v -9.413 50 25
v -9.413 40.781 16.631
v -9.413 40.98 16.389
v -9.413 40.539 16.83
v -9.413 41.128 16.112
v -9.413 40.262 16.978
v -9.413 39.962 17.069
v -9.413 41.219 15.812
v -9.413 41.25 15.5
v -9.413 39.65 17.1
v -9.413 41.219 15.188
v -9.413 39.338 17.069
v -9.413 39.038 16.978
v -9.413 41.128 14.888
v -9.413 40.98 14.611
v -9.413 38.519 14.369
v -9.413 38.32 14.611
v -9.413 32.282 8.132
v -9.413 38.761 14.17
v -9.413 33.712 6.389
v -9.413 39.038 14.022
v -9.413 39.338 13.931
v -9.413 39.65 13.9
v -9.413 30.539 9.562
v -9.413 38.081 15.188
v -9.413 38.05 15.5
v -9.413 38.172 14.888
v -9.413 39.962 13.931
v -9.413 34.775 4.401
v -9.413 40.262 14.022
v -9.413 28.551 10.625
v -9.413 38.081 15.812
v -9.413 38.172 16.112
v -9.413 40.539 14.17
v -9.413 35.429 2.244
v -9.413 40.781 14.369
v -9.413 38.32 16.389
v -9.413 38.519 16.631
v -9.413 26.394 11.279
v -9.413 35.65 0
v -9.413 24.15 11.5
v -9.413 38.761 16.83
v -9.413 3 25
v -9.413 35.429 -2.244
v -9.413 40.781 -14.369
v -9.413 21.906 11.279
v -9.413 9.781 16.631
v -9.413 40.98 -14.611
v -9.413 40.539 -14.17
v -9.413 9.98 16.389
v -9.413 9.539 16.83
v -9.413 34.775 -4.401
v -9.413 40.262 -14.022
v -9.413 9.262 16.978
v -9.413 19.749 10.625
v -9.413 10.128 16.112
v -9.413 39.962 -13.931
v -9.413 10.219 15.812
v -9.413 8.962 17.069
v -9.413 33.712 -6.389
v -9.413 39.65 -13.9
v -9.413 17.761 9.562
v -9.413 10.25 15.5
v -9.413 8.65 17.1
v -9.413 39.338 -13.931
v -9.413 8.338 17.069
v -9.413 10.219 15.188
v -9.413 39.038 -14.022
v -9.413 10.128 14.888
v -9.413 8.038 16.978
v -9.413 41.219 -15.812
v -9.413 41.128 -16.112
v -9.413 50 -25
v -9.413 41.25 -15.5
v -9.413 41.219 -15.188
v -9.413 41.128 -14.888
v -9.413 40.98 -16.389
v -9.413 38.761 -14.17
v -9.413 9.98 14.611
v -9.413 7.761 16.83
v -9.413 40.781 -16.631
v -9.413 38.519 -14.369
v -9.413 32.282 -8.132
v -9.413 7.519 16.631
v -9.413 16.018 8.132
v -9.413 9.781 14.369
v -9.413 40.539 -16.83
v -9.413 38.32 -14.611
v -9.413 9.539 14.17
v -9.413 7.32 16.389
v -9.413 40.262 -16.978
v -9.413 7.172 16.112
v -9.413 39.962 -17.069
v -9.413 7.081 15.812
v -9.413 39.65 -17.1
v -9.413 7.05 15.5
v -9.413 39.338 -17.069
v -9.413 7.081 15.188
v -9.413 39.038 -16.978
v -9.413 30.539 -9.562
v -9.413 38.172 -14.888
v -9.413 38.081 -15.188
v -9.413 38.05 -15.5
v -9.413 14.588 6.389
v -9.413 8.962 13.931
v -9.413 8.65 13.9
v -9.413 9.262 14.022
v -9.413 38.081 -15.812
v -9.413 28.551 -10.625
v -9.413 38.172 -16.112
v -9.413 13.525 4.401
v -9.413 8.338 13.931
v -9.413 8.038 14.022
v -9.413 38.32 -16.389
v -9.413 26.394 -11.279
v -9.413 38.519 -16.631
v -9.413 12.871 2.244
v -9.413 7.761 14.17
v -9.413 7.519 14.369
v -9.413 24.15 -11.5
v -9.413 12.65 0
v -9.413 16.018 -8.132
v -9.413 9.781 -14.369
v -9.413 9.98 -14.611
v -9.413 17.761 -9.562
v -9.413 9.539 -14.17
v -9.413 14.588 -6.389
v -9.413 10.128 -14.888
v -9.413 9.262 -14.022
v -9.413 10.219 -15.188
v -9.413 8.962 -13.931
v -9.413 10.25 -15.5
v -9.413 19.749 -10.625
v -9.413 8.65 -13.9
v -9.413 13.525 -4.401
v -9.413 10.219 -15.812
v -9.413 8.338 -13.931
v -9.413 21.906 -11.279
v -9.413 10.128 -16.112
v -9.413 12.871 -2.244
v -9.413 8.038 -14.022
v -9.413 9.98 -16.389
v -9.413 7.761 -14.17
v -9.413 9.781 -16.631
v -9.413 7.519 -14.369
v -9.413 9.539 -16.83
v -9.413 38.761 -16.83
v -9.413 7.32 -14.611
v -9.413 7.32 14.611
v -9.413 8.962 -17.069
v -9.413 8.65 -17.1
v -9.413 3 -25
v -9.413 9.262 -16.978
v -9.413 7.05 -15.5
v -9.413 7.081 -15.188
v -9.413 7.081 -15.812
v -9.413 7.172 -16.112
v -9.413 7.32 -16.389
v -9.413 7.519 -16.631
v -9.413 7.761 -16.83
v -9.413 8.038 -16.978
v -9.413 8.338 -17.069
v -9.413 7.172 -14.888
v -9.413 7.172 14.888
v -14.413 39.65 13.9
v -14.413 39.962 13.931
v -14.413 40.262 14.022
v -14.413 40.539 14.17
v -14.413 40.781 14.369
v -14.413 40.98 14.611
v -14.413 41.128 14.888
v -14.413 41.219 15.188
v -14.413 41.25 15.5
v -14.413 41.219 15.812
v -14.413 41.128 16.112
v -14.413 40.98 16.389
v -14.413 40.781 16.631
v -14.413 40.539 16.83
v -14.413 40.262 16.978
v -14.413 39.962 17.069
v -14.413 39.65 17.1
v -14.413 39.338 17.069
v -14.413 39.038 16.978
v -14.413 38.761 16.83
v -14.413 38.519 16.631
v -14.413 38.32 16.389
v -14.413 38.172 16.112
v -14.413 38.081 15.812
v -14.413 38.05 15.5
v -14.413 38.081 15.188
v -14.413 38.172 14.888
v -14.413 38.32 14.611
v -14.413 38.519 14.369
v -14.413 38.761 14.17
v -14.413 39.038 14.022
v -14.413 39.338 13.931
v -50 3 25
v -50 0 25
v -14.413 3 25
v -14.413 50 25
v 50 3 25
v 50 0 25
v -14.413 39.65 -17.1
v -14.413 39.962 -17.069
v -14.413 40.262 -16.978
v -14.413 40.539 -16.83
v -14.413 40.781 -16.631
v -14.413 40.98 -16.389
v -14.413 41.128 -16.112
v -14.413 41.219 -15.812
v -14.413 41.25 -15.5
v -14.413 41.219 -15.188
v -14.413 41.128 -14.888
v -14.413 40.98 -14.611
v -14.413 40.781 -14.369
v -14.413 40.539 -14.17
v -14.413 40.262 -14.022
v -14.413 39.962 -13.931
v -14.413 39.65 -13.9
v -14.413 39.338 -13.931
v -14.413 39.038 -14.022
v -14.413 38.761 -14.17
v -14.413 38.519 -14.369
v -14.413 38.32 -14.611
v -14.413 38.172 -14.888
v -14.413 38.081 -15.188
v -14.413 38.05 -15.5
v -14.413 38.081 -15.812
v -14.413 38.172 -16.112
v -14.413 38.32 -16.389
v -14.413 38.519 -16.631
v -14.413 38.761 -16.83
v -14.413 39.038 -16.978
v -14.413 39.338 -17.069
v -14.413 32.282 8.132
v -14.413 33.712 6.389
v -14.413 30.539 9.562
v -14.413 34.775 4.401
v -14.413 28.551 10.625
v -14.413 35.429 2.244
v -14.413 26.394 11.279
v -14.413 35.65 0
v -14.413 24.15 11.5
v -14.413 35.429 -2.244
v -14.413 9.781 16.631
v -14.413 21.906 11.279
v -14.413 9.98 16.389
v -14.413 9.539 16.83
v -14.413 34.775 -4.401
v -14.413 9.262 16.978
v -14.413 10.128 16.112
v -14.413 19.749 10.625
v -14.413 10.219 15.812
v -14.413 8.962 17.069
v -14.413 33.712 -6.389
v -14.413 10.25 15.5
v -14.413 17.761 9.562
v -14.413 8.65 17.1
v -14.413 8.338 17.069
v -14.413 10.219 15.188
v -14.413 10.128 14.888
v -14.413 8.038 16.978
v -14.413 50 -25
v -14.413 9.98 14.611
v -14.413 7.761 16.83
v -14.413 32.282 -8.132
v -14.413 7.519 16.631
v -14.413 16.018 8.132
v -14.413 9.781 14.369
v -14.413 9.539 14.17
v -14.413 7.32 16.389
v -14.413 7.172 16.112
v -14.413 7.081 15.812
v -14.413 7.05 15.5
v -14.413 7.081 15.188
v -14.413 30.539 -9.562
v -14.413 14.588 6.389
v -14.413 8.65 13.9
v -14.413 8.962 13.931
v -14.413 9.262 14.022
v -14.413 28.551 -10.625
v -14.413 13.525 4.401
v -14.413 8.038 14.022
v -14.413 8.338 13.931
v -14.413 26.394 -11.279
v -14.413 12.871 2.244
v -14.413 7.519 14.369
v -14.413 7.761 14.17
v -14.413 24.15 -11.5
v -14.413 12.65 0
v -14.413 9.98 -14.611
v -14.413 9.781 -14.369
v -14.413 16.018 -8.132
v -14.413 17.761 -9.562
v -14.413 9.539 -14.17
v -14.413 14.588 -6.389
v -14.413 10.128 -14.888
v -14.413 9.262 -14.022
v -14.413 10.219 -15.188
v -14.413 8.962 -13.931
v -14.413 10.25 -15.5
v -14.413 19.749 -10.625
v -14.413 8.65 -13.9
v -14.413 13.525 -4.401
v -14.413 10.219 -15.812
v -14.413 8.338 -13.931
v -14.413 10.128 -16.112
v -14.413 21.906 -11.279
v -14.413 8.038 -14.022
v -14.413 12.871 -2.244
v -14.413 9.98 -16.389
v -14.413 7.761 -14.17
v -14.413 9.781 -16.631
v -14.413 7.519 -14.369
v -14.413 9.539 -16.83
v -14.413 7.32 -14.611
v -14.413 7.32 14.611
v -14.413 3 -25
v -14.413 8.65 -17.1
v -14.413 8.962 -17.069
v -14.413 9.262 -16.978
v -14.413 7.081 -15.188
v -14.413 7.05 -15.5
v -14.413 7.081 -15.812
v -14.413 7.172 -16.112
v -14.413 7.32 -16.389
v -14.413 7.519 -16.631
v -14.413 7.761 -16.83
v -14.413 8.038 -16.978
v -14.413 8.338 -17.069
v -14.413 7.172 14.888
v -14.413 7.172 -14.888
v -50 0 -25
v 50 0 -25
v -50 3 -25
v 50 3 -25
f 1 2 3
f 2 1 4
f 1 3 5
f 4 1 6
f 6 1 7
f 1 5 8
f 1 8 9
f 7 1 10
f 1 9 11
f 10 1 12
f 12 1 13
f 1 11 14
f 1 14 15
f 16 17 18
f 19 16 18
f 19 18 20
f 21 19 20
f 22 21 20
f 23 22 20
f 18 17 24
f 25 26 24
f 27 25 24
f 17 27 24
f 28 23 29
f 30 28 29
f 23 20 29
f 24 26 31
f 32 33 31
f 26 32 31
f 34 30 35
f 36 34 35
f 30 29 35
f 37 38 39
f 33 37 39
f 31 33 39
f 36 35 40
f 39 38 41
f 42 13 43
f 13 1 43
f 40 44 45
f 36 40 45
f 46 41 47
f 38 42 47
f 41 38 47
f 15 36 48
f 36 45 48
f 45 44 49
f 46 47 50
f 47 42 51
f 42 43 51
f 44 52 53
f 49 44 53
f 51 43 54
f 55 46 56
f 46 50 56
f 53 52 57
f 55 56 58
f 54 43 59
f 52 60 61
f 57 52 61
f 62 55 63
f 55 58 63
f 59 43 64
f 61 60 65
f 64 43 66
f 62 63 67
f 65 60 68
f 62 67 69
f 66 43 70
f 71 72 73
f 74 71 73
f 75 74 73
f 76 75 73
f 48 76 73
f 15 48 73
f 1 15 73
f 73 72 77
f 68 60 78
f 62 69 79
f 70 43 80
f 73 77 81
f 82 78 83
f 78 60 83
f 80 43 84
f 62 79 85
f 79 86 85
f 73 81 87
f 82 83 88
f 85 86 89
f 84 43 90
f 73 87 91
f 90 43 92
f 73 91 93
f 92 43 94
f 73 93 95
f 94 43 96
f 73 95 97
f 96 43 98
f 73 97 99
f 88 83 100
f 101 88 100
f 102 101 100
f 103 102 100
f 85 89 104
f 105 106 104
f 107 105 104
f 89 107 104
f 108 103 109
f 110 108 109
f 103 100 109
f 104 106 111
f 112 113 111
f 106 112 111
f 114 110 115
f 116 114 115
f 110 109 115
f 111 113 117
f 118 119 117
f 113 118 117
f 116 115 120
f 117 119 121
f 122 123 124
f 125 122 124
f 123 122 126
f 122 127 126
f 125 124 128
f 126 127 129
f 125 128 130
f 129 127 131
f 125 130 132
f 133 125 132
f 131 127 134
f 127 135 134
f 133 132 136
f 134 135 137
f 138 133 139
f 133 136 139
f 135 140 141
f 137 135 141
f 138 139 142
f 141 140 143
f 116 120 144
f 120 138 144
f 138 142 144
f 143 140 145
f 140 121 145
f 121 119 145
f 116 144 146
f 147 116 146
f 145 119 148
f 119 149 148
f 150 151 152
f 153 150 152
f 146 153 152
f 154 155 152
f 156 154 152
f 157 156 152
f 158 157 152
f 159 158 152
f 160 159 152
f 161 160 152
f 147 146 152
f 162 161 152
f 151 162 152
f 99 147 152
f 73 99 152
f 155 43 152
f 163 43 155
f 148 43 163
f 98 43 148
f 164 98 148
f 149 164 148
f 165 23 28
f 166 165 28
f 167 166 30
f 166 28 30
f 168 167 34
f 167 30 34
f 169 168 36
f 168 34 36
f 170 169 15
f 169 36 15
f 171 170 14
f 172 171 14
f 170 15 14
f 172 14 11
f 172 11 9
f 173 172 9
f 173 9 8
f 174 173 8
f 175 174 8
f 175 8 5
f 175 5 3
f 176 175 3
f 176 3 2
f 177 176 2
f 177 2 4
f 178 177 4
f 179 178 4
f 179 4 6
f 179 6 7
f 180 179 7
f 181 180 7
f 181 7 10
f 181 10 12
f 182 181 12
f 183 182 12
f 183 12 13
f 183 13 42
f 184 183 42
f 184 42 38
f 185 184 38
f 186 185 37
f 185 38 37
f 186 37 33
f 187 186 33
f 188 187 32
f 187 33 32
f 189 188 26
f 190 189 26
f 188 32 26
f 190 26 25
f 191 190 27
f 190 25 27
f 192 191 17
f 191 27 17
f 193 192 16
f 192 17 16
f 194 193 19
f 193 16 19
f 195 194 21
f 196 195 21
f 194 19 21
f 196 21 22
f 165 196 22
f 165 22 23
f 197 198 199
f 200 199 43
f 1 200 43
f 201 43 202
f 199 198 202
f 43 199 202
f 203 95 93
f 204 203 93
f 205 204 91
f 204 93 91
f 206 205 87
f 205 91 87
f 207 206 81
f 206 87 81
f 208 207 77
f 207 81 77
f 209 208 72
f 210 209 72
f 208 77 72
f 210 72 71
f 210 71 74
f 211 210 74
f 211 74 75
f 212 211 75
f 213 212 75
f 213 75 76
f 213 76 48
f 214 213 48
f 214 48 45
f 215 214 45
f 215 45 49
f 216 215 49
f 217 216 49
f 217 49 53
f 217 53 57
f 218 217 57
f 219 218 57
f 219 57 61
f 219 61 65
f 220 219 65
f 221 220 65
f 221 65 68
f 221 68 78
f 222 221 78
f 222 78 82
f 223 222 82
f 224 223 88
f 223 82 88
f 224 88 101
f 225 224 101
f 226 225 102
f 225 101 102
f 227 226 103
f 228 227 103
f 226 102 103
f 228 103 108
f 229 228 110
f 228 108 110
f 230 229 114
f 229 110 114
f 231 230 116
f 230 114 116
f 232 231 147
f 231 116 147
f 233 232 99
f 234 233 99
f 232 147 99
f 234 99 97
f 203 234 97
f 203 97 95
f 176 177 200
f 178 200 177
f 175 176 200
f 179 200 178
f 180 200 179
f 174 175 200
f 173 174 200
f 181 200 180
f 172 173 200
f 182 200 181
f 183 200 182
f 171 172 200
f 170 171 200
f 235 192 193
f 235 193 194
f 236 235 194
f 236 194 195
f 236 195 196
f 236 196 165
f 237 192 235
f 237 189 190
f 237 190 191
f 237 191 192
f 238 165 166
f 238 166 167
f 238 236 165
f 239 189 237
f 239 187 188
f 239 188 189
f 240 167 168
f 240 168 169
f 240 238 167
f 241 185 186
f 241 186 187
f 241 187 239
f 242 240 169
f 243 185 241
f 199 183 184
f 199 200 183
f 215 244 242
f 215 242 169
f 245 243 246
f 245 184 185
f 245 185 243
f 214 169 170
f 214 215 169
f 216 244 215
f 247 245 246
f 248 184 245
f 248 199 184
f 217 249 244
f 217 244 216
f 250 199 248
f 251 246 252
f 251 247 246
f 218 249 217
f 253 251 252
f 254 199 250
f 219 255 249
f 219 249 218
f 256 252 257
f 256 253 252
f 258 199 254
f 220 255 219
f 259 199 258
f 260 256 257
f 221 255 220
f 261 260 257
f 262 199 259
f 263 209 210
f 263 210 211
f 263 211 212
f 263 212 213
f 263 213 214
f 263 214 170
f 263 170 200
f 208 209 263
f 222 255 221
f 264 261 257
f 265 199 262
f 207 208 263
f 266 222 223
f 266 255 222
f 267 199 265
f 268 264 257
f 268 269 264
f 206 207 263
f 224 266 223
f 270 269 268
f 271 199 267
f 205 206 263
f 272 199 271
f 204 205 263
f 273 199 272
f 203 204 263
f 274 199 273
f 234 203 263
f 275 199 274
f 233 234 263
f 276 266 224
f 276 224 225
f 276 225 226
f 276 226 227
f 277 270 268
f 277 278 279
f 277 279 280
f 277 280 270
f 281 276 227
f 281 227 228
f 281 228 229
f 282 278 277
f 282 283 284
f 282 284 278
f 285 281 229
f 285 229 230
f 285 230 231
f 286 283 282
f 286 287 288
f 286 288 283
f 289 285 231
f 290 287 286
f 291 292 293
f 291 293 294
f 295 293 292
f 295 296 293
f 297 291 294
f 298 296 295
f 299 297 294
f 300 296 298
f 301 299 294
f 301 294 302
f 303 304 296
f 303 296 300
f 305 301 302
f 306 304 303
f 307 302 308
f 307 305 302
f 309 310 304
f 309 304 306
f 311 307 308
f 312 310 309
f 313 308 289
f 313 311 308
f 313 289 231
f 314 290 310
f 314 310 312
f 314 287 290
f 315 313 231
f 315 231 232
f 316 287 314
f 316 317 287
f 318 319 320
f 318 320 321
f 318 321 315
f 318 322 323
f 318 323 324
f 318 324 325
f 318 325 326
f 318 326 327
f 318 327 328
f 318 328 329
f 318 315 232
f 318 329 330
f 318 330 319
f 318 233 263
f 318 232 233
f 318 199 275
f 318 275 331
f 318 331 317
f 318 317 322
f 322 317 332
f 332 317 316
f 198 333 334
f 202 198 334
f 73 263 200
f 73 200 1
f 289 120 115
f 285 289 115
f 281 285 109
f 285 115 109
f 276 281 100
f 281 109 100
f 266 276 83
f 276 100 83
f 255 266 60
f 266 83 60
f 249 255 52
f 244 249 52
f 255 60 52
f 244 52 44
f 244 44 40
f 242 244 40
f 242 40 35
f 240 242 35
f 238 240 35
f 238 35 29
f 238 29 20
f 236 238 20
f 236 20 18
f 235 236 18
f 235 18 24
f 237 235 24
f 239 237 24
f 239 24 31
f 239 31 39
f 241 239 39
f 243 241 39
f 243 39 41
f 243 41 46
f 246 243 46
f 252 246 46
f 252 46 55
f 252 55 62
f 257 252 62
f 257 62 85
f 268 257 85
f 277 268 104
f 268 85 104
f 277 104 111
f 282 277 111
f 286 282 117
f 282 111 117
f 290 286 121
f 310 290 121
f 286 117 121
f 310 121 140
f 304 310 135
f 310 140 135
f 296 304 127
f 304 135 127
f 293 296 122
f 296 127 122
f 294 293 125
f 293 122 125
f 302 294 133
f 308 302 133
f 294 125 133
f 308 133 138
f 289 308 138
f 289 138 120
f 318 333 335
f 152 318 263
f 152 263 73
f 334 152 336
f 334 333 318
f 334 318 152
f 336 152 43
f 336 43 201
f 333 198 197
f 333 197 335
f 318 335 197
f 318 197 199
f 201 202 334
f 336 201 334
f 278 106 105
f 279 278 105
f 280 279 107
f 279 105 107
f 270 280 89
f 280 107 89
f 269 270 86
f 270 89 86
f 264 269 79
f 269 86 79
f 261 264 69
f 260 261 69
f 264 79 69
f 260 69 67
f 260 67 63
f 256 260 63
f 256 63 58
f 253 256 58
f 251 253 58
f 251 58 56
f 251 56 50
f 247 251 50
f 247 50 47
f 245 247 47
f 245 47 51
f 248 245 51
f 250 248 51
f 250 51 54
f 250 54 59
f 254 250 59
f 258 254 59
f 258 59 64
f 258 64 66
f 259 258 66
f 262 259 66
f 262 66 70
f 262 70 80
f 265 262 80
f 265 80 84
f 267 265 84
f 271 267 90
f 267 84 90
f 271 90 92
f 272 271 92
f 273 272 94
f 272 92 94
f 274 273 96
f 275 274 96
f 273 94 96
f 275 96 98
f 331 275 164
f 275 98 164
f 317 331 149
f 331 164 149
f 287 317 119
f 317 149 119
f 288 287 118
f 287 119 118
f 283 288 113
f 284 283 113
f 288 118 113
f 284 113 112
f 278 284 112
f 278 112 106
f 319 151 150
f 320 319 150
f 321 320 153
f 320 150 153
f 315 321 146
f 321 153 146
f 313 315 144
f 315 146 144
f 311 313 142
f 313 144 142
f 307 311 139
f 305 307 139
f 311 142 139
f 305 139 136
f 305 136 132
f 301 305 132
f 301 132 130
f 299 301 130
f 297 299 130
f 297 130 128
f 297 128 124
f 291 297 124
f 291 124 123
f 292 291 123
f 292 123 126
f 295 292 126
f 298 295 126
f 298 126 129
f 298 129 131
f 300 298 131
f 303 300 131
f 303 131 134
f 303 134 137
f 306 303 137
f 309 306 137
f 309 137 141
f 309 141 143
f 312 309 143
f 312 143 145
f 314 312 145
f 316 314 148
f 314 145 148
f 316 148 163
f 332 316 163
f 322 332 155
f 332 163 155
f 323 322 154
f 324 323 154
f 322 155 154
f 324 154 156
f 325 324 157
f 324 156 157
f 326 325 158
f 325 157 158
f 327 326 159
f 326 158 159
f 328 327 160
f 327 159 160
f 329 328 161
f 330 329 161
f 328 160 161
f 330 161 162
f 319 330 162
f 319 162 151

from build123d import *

# Parameters (mm, degrees)
SKETCH1_W           = 100
SKETCH1_H           = 50
BOSS_EXTRUDE1_DEPTH = 3
SKETCH2_W           = 5
SKETCH2_H           = 50
BOSS_EXTRUDE3_DEPTH = 47
SKETCH8_R           = 11.5
CUT_EXTRUDE3_DEPTH  = 82.577573944
SKETCH9_R           = 1.6
CUT_EXTRUDE4_DEPTH  = 82.577573944


with BuildPart() as part:
    # Sketch1 → Boss-Extrude1 (new body)
    with BuildSketch(Plane(origin=(0, 0, 0), x_dir=(1, 0, 0), z_dir=(0, 1, 0))):
        Rectangle(SKETCH1_W, SKETCH1_H)
    extrude(amount=BOSS_EXTRUDE1_DEPTH)

    # Sketch2 → Boss-Extrude3 (add)
    with BuildSketch(Plane(origin=(0, 3, 0), x_dir=(1, 0, 0), z_dir=(0, 1, 0))):
        with Locations((-11.912966351, 0)):
            Rectangle(SKETCH2_W, SKETCH2_H)
    extrude(amount=BOSS_EXTRUDE3_DEPTH)

    # Sketch8 → Cut-Extrude3 (cut, through all)
    with BuildSketch(Plane(origin=(-9.412966351, 0, 0), x_dir=(0, 0, -1), z_dir=(1, 0, 0))):
        with Locations((1.43e-06, 24.15)):
            Circle(SKETCH8_R)
    extrude(amount=-CUT_EXTRUDE3_DEPTH, mode=Mode.SUBTRACT)

    # Sketch9 → Cut-Extrude4 (cut, through all)
    with BuildSketch(Plane(origin=(-9.412966351, 0, 0), x_dir=(0, 0, -1), z_dir=(1, 0, 0))):
        with Locations((-15.49999857, 8.65)):
            Circle(SKETCH9_R)
        with Locations((-15.49999857, 39.65)):
            Circle(SKETCH9_R)
        with Locations((15.49999857, 39.65)):
            Circle(SKETCH9_R)
        with Locations((15.49999857, 8.65)):
            Circle(SKETCH9_R)
    extrude(amount=-CUT_EXTRUDE4_DEPTH, mode=Mode.SUBTRACT)


solid = part.part
